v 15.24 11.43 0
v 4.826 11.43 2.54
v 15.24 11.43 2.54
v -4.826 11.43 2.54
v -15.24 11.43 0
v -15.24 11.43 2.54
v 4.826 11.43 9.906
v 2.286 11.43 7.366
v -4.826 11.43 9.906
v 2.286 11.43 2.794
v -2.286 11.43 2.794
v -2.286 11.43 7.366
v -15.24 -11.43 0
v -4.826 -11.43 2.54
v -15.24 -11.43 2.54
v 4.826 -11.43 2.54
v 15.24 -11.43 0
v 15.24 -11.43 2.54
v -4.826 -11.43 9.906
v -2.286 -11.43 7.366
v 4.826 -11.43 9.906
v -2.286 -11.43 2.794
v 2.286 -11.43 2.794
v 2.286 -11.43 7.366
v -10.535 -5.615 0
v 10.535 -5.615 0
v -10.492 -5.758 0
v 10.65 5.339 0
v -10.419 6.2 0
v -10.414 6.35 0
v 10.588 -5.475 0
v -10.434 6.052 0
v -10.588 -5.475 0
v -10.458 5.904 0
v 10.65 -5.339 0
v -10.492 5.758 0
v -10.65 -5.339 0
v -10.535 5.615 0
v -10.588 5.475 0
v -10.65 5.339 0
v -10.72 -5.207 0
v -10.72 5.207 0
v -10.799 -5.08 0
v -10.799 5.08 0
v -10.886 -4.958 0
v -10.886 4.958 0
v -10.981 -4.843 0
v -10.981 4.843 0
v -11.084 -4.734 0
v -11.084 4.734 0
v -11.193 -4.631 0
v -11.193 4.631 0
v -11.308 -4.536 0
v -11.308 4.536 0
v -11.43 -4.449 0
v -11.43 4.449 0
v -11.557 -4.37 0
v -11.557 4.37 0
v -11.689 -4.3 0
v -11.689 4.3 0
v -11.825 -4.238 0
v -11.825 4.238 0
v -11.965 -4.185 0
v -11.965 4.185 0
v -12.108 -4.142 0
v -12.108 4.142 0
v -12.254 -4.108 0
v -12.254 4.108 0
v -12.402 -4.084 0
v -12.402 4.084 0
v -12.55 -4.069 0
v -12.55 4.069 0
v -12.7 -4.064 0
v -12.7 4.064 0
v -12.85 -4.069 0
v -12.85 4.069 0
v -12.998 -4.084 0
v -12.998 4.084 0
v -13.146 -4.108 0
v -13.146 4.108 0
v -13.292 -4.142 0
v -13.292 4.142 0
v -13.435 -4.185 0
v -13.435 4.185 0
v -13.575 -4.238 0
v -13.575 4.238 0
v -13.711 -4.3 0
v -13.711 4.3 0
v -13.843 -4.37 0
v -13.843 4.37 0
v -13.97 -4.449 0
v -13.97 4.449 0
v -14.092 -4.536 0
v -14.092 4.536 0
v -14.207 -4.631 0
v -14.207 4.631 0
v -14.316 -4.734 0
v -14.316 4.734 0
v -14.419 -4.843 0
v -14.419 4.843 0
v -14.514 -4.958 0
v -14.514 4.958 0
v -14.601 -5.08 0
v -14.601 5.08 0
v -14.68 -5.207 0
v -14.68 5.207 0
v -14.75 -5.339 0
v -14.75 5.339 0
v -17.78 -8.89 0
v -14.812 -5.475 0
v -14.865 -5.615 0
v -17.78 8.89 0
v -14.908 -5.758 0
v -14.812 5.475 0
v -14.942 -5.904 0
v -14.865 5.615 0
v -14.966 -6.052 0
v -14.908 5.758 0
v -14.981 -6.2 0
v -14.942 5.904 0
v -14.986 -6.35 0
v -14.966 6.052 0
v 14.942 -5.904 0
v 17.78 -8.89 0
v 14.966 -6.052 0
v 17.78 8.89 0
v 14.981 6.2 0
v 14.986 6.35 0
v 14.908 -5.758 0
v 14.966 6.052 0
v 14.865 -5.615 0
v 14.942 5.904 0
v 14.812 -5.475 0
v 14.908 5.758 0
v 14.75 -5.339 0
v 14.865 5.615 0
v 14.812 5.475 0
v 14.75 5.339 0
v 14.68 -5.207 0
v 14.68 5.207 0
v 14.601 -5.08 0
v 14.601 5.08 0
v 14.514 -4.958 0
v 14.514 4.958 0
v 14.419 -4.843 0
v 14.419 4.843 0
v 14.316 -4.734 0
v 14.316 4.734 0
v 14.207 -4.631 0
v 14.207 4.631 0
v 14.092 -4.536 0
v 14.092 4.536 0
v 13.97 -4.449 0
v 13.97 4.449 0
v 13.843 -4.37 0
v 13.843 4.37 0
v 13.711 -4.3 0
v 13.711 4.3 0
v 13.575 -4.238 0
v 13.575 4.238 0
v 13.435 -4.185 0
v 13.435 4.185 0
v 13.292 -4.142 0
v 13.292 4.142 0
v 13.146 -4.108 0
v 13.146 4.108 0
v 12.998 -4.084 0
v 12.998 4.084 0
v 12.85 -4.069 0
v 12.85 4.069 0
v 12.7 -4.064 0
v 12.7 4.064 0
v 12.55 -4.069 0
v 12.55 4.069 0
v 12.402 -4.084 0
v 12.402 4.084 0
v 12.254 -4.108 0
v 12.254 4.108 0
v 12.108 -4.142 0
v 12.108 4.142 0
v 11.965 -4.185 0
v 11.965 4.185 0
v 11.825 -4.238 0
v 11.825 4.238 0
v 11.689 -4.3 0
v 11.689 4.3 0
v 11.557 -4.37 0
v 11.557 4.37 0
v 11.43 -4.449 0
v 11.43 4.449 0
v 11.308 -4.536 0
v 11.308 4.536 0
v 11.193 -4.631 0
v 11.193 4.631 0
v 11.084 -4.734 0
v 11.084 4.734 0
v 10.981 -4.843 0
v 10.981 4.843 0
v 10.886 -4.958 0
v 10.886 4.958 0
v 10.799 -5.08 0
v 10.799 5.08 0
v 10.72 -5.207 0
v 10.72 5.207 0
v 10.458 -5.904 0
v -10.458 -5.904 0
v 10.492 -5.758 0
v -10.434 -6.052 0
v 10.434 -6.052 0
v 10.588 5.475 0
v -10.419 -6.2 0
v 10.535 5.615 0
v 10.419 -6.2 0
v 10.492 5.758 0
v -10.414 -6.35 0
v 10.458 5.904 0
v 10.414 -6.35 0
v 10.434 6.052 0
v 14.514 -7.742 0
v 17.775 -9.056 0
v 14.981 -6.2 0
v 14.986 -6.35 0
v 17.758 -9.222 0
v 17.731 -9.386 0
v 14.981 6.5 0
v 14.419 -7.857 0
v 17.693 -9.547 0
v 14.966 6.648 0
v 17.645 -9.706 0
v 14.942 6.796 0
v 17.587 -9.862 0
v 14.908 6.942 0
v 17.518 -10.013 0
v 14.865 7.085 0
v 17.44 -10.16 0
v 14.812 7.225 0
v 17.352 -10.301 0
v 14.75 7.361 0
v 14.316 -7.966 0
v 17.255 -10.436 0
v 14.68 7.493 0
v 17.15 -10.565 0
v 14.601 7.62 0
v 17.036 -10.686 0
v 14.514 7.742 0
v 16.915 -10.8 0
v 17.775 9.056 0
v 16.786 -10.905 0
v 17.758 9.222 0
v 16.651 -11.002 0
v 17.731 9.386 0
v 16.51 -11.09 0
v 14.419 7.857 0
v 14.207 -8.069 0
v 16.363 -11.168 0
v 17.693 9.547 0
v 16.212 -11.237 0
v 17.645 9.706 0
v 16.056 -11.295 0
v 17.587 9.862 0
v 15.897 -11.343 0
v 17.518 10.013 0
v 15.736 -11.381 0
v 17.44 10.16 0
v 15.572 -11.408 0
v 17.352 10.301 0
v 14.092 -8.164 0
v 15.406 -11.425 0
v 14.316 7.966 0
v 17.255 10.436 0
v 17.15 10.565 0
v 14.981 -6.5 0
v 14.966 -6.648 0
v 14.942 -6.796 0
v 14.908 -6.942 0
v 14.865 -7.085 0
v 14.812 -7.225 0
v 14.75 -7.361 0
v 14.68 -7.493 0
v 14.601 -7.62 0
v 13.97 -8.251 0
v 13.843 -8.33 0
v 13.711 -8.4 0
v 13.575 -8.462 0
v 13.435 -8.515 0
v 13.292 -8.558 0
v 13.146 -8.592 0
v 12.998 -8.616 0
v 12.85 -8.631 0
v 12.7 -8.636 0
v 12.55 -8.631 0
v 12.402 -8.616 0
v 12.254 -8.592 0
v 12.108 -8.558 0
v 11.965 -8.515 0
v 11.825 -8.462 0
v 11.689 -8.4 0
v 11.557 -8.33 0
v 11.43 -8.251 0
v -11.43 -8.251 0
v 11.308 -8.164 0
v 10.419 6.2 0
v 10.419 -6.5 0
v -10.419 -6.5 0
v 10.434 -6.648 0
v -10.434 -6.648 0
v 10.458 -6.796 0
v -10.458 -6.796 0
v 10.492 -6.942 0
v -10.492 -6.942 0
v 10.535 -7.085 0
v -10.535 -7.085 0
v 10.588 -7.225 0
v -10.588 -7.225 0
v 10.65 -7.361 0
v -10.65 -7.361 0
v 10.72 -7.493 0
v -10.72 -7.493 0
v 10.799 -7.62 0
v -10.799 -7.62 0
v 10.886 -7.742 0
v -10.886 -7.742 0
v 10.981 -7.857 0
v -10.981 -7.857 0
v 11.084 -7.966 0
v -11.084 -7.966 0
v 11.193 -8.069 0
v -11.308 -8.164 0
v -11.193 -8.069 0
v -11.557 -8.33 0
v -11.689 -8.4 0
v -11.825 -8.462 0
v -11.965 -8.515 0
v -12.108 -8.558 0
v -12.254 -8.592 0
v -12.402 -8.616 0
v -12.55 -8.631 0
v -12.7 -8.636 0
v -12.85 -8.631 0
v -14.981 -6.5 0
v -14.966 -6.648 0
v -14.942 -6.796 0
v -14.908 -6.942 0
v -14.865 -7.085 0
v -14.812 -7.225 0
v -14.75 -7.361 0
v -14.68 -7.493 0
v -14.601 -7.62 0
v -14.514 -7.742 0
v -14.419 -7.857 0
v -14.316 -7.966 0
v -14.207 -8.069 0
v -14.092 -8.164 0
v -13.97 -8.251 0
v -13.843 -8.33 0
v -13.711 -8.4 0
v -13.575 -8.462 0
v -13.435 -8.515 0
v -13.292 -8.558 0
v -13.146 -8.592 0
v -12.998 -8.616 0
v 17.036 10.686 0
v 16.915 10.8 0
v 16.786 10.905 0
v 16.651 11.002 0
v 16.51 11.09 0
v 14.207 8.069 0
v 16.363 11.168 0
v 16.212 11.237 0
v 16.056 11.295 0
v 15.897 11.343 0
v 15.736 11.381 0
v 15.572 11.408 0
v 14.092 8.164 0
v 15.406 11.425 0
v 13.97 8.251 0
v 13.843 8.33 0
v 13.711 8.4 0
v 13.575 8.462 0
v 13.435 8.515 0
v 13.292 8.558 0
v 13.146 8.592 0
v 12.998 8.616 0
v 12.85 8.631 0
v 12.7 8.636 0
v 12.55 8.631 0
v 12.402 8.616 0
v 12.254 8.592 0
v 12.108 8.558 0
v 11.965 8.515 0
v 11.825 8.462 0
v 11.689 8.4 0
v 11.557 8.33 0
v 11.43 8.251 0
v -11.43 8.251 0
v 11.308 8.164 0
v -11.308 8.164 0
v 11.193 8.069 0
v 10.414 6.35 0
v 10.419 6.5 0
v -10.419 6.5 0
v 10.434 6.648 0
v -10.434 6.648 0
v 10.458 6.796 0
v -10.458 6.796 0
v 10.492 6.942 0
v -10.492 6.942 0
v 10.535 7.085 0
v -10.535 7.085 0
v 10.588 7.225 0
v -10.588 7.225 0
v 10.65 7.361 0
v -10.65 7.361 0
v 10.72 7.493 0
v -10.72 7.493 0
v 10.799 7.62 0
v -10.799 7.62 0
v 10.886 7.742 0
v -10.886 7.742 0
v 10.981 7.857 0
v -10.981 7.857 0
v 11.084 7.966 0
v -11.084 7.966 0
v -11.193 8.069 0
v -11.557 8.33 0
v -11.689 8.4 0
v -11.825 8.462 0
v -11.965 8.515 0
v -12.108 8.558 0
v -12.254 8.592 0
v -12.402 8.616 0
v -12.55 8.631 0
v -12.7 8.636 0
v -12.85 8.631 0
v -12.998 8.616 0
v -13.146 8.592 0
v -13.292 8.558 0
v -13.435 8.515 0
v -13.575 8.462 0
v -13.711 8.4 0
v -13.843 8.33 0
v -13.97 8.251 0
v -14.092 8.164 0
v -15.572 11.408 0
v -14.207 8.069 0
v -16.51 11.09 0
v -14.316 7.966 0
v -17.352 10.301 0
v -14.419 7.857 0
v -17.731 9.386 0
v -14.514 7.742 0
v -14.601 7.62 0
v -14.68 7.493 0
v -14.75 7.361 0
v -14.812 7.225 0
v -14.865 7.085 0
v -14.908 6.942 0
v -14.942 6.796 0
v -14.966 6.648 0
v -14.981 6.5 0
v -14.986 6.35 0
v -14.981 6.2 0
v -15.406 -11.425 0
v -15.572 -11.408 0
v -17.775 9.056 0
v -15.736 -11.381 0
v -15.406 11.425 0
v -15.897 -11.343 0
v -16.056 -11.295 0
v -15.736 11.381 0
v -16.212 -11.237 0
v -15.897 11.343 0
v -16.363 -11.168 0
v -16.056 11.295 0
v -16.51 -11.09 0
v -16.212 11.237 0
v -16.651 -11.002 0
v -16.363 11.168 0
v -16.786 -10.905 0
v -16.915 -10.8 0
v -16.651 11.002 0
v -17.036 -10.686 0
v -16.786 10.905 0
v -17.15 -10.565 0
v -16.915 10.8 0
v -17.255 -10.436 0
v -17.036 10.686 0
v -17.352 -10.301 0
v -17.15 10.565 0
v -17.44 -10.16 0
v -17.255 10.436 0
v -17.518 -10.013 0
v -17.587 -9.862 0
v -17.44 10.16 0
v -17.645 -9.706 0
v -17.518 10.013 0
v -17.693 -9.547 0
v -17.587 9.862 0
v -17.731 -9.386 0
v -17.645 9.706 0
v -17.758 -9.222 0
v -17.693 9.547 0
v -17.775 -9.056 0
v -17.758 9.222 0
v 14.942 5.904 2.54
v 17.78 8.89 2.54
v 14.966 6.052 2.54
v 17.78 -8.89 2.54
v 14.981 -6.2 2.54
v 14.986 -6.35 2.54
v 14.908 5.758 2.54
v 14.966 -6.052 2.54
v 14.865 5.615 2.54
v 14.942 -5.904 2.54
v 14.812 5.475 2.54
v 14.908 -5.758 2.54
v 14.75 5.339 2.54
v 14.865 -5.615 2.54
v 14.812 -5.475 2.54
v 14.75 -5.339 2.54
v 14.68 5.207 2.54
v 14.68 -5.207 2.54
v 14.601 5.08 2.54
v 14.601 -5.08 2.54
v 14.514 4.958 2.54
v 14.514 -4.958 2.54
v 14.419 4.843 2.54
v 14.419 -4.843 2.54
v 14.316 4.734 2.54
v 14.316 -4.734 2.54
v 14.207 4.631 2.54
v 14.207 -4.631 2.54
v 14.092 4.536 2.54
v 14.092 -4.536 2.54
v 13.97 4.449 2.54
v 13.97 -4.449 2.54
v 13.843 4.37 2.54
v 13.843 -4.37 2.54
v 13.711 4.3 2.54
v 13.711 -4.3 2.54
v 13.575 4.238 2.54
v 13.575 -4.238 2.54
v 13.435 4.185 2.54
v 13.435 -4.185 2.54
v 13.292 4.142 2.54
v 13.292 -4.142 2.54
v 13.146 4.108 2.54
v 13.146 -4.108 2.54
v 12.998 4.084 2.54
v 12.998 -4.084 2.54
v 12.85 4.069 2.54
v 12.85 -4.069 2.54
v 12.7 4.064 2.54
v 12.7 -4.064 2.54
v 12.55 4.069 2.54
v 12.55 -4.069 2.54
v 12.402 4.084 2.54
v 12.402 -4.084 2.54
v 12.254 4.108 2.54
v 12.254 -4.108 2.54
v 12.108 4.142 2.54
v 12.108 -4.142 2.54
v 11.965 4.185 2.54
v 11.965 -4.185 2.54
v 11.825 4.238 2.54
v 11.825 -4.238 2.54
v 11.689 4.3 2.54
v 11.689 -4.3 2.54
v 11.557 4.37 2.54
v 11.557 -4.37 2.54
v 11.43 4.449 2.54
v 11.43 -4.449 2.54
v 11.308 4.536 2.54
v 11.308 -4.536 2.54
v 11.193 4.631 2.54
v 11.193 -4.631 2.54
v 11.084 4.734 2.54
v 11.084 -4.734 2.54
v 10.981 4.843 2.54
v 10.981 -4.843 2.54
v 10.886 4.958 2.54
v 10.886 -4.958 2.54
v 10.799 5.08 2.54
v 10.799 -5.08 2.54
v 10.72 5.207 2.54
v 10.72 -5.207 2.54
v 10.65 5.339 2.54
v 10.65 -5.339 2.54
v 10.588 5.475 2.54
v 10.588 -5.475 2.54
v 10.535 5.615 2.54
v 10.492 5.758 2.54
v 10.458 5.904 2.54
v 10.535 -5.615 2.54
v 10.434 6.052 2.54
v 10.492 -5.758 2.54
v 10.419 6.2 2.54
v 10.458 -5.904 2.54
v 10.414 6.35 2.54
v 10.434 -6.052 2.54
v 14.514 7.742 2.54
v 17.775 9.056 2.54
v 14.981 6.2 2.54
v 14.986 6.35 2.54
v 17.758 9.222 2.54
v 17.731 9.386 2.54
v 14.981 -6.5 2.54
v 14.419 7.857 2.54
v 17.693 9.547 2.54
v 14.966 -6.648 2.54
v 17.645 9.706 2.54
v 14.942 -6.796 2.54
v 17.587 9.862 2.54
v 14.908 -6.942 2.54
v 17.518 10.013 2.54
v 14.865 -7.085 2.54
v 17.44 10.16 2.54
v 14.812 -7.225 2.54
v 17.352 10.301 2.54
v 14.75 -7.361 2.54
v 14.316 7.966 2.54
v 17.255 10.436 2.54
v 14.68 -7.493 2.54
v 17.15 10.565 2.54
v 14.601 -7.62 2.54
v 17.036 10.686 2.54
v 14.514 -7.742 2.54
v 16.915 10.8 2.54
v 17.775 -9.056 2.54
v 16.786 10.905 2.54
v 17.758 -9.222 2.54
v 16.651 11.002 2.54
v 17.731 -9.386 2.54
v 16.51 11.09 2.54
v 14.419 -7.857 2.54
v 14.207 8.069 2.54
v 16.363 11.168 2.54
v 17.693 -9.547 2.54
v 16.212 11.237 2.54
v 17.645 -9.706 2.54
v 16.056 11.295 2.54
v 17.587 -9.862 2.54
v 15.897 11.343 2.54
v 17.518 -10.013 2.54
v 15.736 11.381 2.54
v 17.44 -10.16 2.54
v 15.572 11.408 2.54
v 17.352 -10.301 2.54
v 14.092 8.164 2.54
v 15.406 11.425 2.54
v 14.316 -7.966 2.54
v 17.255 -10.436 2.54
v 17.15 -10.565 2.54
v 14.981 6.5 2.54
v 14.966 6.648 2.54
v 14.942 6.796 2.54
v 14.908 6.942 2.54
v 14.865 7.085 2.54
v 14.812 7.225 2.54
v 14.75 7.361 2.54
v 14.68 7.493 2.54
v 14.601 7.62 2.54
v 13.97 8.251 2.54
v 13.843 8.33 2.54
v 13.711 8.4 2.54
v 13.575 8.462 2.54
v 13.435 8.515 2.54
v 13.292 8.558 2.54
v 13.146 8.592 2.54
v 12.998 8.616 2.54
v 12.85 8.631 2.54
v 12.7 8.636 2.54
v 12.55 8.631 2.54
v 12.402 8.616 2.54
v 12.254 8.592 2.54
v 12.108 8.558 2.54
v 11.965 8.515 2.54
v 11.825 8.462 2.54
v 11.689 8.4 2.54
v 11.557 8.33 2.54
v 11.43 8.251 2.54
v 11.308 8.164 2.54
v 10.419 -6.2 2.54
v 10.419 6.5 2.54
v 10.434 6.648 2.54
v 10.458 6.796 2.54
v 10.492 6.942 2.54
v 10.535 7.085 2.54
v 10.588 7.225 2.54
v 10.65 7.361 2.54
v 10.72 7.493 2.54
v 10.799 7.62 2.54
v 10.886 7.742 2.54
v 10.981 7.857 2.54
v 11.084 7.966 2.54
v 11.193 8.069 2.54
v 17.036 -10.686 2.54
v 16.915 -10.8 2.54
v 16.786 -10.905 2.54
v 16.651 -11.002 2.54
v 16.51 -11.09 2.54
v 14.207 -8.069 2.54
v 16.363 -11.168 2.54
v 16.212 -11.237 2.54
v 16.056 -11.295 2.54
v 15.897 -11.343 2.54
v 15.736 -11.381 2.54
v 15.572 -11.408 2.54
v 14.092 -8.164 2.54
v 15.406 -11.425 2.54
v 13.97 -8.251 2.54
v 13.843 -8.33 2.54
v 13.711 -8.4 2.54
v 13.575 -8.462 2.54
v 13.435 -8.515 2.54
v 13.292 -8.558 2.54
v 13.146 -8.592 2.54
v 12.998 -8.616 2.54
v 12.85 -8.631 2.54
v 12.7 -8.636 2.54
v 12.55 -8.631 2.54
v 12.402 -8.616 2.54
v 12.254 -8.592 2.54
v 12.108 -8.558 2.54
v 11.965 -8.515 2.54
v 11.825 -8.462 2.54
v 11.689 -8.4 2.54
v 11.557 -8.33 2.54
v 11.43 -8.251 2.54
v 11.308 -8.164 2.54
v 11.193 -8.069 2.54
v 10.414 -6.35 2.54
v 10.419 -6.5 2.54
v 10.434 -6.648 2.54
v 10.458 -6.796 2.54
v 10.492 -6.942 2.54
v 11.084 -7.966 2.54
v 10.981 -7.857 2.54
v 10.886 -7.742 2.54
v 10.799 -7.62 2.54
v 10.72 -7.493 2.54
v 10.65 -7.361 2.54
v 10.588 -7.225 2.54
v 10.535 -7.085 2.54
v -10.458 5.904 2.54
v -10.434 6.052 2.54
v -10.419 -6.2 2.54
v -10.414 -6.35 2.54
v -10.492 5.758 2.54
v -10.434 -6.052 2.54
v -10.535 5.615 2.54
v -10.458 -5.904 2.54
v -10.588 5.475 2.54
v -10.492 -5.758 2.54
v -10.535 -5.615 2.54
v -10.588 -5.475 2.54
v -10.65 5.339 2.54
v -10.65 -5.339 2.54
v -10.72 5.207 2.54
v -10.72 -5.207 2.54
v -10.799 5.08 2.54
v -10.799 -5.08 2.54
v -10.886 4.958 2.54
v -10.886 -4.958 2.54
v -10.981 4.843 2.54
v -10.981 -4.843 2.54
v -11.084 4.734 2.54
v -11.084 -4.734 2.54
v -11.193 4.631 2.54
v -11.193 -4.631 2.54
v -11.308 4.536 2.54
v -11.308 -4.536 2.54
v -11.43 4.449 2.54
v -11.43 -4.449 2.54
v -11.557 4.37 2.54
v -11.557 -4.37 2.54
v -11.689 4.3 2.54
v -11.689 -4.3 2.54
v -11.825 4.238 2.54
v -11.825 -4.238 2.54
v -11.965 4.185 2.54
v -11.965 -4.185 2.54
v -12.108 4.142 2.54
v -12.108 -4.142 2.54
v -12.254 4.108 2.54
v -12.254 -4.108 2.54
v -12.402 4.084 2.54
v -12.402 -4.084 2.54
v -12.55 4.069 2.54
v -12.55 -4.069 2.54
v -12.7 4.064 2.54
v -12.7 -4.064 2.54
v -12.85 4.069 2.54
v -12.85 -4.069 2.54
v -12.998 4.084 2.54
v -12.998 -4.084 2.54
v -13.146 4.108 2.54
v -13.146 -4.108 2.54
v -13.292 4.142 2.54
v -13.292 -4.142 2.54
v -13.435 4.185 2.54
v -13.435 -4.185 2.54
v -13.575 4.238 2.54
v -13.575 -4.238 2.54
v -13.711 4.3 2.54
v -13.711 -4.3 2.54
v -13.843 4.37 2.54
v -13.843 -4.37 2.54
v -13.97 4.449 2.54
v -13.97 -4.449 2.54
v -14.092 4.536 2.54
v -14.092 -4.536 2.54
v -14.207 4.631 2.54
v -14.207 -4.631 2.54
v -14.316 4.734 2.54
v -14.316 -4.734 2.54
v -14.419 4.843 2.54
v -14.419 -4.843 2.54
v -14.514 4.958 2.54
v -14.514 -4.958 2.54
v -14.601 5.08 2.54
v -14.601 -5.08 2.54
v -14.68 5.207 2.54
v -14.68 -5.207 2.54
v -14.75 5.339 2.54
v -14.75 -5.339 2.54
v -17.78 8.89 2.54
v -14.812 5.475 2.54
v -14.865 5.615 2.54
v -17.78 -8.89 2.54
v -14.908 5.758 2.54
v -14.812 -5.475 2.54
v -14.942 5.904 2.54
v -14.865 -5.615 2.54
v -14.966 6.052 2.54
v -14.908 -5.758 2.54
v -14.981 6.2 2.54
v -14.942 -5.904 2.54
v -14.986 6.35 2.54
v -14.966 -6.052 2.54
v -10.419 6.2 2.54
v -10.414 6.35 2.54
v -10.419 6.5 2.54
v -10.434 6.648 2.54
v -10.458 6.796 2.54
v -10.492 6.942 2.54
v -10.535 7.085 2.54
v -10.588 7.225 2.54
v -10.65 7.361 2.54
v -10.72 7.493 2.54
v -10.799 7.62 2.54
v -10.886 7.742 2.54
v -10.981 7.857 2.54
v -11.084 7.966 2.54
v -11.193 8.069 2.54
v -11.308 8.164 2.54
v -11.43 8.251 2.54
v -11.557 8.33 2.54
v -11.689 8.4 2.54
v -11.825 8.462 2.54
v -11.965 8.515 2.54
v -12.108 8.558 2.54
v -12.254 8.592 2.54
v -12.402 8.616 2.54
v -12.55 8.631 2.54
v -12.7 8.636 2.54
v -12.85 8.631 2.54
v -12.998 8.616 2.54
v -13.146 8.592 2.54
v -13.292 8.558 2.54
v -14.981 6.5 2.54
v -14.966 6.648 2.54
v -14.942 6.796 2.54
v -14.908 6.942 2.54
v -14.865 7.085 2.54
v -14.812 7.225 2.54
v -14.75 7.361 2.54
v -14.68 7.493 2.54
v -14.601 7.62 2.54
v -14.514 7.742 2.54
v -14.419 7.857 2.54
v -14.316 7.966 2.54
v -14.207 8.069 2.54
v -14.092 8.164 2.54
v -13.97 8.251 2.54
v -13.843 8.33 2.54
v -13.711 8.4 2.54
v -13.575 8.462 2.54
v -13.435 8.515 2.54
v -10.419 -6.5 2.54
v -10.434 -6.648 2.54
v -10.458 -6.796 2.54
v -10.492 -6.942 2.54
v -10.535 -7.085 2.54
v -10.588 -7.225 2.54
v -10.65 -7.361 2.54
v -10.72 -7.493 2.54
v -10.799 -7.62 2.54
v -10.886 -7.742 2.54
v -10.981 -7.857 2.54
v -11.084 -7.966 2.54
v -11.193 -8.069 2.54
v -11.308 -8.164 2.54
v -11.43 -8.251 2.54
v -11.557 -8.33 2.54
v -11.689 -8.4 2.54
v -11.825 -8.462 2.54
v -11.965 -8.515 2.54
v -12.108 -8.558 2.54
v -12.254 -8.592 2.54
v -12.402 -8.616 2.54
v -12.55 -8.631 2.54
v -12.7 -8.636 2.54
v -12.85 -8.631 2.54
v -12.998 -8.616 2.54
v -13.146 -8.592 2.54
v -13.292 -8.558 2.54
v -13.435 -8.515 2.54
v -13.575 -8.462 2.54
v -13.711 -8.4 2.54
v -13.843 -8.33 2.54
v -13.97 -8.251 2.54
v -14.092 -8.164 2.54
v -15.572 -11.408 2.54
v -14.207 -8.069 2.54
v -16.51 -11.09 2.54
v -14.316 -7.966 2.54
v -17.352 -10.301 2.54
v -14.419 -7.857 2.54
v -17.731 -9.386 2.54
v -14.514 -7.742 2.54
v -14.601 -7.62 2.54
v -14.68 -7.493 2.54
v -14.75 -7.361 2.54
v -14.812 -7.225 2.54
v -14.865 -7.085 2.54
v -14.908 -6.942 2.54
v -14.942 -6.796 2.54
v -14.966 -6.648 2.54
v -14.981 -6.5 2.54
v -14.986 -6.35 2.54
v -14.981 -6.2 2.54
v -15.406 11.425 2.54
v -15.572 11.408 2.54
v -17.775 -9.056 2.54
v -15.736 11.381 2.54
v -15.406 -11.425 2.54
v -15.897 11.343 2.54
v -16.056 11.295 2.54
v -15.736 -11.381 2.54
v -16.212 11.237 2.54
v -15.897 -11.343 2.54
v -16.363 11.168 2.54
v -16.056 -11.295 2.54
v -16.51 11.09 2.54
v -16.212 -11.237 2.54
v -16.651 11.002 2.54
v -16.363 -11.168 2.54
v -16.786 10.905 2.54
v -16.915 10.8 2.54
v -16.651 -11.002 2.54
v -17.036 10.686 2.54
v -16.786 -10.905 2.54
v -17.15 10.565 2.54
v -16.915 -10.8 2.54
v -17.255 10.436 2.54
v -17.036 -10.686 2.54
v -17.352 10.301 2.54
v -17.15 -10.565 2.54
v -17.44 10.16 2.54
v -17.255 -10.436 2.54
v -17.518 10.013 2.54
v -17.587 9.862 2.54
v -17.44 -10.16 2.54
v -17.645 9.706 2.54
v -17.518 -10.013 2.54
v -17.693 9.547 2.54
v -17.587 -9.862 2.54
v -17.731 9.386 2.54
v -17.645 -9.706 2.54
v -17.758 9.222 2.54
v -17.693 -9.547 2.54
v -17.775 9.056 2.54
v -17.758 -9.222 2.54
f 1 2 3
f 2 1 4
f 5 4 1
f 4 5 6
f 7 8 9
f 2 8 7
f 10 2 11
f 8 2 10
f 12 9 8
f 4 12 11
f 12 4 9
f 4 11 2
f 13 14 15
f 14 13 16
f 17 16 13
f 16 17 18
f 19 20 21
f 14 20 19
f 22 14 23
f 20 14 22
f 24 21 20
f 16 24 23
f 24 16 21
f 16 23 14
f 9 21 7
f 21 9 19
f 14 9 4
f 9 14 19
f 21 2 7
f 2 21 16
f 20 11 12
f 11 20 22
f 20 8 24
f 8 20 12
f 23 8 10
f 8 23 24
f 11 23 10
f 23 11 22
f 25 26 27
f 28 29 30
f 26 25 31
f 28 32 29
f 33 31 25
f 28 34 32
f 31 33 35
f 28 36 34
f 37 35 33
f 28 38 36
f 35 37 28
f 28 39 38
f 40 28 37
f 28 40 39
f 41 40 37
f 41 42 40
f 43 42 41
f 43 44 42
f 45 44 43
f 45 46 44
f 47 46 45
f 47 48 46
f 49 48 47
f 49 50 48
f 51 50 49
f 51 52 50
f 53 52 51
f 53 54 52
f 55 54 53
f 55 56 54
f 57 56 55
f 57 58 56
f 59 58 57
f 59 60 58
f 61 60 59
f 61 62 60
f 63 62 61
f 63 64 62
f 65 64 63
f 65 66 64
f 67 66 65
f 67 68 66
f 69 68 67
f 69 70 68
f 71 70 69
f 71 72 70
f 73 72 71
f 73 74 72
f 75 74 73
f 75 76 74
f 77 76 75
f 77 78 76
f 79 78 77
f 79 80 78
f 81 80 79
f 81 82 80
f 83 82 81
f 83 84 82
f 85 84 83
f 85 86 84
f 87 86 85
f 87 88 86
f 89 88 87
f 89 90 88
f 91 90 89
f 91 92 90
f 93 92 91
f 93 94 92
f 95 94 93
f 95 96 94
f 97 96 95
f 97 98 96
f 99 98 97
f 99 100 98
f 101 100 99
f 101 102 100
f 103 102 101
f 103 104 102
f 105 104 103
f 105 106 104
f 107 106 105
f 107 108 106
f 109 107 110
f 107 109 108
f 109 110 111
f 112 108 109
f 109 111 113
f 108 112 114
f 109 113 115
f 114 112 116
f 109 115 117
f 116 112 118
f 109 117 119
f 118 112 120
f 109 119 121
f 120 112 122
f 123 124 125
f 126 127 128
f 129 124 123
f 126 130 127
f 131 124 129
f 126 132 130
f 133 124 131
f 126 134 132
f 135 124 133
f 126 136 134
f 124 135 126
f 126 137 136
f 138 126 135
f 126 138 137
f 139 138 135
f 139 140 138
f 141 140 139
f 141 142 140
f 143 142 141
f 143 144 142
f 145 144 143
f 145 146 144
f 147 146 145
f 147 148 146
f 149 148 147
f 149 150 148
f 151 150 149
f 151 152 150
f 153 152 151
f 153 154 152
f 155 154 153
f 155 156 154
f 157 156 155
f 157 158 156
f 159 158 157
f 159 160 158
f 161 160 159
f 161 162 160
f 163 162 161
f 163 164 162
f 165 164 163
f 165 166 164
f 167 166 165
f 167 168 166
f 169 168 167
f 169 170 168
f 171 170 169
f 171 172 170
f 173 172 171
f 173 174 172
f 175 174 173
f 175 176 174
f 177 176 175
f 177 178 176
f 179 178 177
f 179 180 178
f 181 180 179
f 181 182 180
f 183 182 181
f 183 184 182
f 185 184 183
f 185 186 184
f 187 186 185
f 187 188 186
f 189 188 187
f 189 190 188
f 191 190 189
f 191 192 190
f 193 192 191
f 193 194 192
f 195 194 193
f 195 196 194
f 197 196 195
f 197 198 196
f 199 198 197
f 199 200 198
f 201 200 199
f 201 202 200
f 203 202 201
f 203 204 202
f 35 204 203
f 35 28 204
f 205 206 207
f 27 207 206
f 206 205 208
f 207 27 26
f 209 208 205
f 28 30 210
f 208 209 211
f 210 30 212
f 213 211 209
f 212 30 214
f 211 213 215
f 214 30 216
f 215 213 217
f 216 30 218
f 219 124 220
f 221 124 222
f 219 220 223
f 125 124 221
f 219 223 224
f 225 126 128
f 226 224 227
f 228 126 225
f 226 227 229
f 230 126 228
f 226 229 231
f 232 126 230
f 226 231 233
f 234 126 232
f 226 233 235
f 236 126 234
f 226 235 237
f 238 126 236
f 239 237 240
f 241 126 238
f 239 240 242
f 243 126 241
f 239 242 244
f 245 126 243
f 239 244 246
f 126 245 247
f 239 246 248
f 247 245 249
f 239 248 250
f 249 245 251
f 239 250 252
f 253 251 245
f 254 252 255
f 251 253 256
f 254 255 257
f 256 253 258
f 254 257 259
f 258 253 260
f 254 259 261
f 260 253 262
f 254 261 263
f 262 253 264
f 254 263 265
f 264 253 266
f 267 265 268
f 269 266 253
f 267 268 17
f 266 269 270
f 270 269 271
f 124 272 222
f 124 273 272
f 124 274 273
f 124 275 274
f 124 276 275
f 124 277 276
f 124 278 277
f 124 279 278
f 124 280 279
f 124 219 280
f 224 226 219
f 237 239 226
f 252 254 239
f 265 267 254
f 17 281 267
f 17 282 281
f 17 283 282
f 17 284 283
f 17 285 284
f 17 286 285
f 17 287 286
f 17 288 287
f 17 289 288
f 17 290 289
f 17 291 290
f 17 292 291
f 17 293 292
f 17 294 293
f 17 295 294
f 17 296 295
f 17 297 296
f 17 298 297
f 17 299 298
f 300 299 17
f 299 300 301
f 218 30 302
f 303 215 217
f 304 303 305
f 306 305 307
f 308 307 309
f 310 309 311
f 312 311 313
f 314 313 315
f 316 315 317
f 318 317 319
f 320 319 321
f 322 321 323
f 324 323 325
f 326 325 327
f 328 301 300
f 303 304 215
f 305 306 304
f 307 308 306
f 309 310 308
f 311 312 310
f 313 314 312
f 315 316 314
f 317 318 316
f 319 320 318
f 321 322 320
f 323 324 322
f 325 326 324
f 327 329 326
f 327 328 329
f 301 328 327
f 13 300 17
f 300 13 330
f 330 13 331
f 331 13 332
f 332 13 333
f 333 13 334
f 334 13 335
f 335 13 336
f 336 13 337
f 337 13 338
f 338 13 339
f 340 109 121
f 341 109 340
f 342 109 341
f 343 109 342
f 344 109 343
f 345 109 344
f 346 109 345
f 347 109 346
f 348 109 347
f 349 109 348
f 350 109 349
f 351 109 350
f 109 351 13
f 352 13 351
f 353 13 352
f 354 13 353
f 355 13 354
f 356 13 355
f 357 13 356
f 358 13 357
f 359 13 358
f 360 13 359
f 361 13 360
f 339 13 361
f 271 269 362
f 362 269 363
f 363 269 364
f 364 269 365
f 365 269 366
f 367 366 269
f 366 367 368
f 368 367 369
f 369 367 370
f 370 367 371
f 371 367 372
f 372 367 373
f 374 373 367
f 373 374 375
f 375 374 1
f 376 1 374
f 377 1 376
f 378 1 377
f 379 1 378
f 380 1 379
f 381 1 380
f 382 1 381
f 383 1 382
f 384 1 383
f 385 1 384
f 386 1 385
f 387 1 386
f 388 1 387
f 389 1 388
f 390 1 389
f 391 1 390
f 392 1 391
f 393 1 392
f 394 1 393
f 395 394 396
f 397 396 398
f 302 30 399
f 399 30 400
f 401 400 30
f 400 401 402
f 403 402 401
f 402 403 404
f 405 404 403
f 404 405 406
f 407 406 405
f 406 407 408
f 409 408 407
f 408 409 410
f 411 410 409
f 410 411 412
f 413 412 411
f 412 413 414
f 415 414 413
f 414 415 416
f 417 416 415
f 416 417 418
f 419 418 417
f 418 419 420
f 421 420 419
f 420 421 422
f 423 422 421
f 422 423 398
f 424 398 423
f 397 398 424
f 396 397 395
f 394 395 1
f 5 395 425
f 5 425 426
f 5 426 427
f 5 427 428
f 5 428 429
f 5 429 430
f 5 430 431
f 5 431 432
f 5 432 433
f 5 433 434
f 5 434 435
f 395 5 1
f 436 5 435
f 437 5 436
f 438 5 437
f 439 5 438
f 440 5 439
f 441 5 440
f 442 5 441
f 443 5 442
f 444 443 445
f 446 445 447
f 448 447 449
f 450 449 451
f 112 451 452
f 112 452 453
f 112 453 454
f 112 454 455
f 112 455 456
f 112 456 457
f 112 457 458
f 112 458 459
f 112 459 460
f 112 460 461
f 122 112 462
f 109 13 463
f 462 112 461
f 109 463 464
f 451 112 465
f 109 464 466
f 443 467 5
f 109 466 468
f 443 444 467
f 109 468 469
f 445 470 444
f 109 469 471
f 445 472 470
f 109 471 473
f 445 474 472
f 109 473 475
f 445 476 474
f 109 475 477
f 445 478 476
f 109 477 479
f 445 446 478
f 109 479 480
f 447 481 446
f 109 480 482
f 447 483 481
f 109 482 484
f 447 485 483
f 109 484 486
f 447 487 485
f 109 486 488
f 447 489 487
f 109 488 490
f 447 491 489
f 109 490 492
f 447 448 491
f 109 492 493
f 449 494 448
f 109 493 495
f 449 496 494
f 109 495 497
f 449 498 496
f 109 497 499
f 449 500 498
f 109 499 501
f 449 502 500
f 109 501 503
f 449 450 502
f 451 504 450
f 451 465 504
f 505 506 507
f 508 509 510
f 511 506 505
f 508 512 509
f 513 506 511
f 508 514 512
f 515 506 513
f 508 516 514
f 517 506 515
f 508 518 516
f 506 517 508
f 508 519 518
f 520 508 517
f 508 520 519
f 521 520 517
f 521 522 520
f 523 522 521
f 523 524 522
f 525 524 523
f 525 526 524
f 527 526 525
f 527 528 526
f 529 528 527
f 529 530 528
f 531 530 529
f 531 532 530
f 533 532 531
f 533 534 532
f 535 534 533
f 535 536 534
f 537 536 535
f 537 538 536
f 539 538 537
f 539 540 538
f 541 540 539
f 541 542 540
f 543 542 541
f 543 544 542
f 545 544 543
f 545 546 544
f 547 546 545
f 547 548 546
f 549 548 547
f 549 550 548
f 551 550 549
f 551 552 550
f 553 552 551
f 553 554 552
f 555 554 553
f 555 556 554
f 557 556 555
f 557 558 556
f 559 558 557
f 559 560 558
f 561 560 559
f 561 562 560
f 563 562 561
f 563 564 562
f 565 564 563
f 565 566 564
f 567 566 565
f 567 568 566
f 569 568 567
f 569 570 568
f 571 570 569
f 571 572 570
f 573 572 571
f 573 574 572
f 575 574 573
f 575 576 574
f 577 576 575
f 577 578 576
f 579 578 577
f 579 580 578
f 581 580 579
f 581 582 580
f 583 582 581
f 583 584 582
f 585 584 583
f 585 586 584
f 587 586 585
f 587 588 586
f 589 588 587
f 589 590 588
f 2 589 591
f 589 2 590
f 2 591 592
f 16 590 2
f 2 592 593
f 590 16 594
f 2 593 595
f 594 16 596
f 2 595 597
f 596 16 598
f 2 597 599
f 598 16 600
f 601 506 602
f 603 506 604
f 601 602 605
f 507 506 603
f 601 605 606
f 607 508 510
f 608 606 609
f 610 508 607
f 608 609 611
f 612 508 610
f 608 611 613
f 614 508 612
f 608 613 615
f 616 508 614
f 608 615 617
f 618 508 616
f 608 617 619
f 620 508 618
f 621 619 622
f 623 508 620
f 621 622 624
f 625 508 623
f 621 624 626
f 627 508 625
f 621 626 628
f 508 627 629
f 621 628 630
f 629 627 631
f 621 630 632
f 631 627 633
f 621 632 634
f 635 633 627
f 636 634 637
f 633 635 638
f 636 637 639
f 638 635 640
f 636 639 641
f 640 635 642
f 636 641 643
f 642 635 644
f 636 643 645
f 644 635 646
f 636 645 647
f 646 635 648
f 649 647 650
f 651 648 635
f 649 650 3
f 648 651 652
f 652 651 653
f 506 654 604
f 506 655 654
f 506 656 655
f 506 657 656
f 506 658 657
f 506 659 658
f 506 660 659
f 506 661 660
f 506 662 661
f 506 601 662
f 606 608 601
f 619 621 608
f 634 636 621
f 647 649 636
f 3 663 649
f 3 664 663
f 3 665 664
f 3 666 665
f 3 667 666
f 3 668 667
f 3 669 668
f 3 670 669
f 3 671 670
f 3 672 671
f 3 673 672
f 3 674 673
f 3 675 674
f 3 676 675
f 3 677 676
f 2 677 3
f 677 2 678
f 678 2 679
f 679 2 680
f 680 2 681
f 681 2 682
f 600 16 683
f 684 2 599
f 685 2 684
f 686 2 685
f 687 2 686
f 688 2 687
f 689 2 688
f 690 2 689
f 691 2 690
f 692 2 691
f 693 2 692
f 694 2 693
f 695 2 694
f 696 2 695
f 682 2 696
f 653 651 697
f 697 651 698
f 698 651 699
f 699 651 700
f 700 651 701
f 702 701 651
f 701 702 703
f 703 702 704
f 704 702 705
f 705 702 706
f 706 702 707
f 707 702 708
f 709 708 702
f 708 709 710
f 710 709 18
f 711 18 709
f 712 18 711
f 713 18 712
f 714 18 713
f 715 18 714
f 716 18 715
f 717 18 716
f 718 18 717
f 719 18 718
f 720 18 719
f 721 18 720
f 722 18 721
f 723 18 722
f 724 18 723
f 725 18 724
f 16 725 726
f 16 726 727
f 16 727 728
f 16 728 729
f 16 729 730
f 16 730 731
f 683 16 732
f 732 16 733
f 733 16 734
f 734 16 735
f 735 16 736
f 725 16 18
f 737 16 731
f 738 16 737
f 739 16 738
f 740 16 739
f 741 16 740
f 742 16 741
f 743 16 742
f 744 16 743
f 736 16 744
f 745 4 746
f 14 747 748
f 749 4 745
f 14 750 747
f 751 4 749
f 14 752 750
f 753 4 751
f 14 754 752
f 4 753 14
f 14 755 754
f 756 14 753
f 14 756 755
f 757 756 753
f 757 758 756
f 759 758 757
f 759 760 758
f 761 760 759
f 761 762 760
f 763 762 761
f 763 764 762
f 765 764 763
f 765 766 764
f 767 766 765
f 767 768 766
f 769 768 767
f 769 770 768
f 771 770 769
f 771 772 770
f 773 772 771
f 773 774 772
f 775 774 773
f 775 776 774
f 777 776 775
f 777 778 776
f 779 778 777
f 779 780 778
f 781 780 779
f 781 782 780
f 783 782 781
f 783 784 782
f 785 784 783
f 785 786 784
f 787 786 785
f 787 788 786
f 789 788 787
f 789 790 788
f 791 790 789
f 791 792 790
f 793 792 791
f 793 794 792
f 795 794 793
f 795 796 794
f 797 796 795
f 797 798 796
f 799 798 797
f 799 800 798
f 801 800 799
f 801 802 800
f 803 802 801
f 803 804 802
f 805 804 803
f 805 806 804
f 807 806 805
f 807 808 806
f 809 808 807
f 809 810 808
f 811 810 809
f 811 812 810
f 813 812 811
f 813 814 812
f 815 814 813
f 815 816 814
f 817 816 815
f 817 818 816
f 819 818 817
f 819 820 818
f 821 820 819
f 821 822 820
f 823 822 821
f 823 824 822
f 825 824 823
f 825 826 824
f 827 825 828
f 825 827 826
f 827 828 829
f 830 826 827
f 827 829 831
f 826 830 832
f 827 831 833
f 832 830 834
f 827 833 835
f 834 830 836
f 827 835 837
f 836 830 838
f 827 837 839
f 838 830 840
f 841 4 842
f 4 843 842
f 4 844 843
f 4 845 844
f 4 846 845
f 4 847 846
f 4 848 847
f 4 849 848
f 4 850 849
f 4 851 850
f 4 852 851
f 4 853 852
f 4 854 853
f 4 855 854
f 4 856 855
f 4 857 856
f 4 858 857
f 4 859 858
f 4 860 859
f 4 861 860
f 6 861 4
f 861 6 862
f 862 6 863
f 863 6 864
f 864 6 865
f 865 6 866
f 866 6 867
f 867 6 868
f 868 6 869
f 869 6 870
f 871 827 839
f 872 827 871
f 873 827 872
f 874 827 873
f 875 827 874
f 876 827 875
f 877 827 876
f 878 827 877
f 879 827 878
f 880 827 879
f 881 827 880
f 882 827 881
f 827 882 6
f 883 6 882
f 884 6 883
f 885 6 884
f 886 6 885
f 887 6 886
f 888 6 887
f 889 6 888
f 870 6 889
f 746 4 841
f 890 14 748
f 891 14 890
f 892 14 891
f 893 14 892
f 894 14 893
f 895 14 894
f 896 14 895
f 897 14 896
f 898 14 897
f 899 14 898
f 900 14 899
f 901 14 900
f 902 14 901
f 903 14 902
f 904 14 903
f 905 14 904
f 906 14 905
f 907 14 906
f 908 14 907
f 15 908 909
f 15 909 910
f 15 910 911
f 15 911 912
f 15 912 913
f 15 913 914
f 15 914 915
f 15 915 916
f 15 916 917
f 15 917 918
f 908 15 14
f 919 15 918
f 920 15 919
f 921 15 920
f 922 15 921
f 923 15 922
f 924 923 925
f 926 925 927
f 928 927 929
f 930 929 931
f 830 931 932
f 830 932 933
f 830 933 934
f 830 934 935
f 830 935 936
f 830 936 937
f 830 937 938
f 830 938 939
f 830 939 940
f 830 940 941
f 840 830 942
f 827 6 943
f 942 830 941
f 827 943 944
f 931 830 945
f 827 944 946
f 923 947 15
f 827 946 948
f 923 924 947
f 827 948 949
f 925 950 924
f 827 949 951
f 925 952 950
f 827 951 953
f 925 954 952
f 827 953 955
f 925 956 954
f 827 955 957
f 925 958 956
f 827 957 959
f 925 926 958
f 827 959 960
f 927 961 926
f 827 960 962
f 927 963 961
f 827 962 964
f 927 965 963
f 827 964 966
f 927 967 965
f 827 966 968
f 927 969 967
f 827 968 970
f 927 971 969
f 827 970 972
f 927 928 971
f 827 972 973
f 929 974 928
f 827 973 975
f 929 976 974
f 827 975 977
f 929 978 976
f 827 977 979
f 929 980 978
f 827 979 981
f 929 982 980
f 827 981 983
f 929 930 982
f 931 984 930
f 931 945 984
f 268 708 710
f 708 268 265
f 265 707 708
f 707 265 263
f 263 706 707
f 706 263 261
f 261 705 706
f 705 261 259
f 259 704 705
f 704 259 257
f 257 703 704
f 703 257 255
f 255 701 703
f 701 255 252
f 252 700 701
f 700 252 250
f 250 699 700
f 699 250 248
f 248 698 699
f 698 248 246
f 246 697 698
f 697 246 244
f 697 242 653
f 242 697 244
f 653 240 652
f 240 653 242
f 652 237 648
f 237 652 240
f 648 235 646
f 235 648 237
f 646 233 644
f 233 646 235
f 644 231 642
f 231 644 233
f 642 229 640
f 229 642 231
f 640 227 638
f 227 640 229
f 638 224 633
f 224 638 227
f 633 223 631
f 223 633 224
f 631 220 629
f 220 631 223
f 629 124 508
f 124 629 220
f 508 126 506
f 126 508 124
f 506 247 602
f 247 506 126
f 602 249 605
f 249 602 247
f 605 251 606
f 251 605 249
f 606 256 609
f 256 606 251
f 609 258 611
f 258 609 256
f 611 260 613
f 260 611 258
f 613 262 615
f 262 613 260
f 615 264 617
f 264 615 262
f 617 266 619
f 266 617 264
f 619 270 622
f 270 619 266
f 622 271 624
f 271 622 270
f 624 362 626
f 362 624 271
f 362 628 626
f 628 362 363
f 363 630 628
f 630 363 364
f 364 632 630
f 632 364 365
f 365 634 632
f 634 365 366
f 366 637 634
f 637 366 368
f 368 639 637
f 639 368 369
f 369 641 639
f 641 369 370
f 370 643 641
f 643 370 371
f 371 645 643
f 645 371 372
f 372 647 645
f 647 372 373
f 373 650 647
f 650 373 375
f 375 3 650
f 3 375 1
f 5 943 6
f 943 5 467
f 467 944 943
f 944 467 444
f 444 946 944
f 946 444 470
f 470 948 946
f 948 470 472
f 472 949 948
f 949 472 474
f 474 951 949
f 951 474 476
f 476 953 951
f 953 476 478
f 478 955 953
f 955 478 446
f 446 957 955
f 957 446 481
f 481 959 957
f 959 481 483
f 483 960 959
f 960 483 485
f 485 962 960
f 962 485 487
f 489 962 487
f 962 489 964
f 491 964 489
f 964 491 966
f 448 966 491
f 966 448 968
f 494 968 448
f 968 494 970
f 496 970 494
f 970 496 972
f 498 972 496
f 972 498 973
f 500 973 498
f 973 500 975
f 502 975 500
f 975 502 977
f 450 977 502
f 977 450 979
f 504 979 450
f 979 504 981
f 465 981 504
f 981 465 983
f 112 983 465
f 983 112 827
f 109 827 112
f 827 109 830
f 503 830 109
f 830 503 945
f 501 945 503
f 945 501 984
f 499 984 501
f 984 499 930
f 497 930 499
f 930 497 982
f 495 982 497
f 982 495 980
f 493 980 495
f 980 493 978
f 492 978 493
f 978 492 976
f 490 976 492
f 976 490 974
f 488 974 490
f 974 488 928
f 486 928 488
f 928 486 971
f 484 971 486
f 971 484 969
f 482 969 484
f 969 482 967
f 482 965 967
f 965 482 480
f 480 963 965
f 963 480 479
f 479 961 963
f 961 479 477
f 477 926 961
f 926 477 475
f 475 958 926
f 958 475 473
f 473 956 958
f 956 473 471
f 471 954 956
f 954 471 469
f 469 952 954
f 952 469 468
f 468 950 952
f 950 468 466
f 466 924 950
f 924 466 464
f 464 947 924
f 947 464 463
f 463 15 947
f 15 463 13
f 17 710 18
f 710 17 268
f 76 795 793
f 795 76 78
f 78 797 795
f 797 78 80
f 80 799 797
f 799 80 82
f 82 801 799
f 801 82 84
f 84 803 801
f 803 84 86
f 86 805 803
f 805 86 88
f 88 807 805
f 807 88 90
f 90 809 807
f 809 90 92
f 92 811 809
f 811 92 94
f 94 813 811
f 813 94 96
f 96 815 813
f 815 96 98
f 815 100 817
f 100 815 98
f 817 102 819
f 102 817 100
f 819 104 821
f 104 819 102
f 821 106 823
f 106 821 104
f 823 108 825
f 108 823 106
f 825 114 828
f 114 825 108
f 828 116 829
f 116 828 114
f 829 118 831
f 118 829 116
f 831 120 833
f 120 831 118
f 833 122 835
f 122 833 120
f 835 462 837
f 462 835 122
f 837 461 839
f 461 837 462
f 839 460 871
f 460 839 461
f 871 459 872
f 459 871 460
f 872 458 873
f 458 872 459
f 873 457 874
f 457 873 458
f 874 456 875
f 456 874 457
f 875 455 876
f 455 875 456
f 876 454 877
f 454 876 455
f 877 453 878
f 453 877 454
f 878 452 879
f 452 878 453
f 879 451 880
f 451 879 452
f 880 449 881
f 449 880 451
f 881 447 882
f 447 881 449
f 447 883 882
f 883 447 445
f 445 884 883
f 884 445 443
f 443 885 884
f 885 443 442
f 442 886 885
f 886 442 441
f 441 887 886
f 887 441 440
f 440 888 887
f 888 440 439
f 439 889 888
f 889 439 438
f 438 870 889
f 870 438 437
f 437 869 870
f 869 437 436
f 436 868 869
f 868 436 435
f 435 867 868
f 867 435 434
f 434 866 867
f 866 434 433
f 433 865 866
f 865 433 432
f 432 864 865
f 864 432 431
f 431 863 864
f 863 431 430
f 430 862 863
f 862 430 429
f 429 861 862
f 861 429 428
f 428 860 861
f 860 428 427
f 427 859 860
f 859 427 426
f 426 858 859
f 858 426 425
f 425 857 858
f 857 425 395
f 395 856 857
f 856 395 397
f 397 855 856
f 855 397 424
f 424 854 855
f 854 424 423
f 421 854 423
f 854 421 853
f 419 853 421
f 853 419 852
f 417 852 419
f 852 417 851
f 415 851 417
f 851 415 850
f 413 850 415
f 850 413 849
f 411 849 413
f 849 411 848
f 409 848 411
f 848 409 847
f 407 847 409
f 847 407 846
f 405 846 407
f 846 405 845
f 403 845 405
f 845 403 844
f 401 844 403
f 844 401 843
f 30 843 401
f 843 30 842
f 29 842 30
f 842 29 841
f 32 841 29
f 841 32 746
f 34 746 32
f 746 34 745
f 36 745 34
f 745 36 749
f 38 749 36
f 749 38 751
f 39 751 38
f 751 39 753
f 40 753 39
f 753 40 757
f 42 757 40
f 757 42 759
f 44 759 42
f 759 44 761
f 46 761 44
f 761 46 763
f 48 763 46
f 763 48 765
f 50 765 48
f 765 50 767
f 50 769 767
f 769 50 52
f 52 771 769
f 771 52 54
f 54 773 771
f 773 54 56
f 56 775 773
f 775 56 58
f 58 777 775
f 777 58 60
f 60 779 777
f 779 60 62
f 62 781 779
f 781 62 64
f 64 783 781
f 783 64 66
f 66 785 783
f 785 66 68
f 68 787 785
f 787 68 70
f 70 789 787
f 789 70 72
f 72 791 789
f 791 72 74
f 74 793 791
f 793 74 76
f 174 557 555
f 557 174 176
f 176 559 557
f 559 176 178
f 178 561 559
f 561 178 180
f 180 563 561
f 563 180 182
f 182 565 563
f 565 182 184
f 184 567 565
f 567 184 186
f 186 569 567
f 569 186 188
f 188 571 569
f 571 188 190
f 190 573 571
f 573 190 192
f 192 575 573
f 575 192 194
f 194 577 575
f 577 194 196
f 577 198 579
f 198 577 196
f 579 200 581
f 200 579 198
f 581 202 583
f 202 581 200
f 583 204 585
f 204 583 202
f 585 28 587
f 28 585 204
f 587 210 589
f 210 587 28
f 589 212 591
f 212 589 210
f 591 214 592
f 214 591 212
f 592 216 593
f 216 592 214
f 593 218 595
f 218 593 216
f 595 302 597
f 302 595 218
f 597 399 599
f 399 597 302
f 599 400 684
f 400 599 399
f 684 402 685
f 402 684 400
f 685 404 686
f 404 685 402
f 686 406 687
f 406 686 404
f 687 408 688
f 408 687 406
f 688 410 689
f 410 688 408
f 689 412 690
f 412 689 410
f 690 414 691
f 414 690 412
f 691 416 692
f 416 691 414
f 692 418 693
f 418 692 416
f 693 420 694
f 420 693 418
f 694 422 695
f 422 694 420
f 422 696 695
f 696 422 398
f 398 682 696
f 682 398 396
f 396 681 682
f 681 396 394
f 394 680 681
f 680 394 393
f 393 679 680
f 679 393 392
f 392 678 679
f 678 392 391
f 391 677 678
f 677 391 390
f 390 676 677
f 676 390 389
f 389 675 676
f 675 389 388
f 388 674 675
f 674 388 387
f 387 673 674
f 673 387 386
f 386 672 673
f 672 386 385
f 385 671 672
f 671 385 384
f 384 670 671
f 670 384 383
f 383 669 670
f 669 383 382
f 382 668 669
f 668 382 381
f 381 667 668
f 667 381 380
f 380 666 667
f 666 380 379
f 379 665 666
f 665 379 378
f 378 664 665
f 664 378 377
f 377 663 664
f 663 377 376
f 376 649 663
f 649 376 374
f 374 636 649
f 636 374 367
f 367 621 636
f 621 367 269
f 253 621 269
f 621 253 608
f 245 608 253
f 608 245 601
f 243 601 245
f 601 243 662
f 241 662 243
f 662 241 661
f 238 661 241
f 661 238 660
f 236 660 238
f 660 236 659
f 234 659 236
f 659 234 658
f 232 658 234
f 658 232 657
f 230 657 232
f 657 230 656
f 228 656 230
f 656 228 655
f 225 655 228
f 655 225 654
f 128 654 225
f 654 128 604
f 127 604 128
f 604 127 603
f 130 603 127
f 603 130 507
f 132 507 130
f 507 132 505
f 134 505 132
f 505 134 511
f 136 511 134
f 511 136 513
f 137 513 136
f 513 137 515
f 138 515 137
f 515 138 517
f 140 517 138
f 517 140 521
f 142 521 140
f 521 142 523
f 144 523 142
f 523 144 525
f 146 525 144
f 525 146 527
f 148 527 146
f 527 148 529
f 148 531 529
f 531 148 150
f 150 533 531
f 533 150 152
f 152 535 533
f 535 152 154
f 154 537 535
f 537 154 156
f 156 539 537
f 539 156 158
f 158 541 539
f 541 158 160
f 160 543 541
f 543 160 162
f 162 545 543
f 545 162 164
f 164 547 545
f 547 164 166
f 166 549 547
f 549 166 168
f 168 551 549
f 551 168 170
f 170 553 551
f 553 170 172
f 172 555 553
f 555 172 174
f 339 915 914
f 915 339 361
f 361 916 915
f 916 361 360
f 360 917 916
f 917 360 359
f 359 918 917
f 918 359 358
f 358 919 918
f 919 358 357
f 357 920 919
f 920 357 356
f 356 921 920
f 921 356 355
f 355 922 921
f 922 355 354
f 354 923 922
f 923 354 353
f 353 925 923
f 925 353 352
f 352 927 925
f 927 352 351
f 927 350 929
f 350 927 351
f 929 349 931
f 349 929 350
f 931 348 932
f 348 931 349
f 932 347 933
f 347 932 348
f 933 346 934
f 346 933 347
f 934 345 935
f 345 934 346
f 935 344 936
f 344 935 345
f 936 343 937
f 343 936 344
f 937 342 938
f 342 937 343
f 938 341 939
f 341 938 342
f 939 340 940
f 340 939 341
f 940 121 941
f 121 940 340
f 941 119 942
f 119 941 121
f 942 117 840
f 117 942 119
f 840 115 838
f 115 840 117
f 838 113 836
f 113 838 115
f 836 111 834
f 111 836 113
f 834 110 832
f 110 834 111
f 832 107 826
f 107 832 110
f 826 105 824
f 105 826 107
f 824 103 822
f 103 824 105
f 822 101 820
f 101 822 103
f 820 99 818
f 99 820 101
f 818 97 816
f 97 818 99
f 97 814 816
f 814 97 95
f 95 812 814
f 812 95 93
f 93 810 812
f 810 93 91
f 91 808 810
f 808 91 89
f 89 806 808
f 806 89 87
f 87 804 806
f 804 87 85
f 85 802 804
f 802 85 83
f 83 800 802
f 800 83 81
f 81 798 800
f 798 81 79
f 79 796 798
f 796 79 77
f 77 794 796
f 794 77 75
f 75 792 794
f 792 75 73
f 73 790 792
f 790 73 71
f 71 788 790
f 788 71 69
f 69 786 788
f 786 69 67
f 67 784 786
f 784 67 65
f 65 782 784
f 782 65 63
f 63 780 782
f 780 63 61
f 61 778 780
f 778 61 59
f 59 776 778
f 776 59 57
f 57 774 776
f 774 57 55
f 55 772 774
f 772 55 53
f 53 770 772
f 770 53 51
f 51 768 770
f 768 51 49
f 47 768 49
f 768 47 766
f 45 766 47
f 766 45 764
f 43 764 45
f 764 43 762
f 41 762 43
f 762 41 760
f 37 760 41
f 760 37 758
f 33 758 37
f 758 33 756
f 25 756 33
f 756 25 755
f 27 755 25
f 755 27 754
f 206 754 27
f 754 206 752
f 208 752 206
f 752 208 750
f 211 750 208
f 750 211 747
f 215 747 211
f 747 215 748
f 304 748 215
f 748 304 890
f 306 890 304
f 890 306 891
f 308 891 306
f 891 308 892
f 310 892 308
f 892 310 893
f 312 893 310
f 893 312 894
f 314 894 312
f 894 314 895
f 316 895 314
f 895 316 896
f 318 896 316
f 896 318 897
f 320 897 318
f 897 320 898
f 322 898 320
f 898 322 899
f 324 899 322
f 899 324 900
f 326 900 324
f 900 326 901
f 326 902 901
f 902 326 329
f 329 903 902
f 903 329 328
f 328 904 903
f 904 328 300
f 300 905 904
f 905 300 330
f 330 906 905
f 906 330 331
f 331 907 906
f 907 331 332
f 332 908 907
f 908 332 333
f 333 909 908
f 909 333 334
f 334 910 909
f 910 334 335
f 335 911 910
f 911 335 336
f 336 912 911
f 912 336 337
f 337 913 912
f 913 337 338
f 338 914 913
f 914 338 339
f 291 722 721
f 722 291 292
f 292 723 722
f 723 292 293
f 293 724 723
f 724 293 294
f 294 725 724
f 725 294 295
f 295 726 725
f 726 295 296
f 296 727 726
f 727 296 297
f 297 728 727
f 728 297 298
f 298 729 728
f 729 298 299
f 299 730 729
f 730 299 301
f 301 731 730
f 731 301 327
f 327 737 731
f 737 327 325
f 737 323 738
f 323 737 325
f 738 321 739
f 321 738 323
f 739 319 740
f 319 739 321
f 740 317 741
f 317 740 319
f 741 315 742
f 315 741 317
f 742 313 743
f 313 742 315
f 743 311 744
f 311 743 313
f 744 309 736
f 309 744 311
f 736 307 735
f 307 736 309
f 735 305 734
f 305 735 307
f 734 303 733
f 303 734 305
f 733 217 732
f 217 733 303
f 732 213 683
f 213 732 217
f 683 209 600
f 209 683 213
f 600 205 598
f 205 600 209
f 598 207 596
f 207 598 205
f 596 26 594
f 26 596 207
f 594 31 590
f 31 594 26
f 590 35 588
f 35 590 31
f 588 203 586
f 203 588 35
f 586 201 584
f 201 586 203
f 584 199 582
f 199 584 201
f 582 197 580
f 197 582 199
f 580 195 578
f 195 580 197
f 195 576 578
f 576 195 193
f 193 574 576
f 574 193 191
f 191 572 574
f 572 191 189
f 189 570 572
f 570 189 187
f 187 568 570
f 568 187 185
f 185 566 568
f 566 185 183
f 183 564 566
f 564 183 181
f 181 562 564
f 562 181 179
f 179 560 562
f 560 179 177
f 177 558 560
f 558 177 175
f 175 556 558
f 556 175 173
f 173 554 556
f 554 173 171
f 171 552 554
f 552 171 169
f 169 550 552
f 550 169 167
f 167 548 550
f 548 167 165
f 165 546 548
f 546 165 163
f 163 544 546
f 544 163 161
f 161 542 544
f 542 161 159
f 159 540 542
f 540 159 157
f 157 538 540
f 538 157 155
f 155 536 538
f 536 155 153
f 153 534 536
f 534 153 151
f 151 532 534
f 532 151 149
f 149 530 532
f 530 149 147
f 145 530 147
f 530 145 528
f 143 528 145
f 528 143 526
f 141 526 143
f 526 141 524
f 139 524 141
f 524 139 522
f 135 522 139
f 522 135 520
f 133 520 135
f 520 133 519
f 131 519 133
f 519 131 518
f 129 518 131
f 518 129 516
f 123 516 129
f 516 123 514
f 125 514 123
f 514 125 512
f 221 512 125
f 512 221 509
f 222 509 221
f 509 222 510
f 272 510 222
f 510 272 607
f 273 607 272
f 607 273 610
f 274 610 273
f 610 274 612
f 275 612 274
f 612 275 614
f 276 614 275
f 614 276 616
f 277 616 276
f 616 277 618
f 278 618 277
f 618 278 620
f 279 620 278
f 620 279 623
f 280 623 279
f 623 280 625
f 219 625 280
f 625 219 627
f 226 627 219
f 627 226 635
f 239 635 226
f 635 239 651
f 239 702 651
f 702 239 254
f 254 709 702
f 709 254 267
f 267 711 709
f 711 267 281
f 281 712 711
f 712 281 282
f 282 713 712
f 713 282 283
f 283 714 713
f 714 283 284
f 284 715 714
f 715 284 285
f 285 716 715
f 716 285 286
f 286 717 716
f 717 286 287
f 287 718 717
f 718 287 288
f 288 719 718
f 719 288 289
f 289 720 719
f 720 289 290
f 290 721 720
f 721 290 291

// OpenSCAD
ViewScale = [0.0254, 0.0254, 0.0254];

module model_nut()
{
    linear_extrude(170)
    difference()
    {
        circle(377/2, $fn=6);
        circle(140/2, $fn=96);
    }

    translate([0, 0, 169])
    linear_extrude(60)
    difference()
    {
        circle(320/2, $fn=96);
        circle(140/2, $fn=96);
    }
}

module model_bolt()
{
    // head
    linear_extrude(160)
    circle(268/2, $fn=96);

    // Body
    translate([0, 0, 159])
    linear_extrude(1210)
    circle(162/2, $fn=96);
}

module model_rod()
{
    linear_extrude(130)
    square([130, 1000], center=true);
}

module adj_rrect(w,h,r)
{
    hull()
    {
        translate([w/2-r, h/2-r, 0])
        circle(r, $fn=96);
        translate([-w/2+r, h/2-r, 0])
        circle(r, $fn=96);

        translate([w/2-r, -h/2+r, 0])
        circle(r, $fn=96);
        translate([-w/2+r, -h/2+r, 0])
        circle(r, $fn=96);
    }
}


module adj_boltswivelmodule()
{
    difference()
    {
        linear_extrude(300)
        square([500, 500], center = true);

        translate([0, 300, 150])
        rotate([90, 0, 0])
        linear_extrude(600)
        circle(180/2, $fn=96);
    }

}
module adj_boltswivel()
{
    // Body
    for (ii=[0,299,599,899])
    {
        translate([0, 0, ii])
        adj_boltswivelmodule();
    }

    // bolt head insert
    translate([0, 0, 1199])
    linear_extrude(171)
    difference()
    {
        square([500, 500], center=true);
        circle(283/2, $fn=96);
        translate([0, 250, 0])
        square([283, 500], center=true);
    }

    // bolt head capture
    translate([0, 0, 1369])
    linear_extrude(171)
    difference()
    {
        square([500, 500], center=true);
        circle(283/2, $fn=96);
        translate([0, 250, 0])
        square([180, 500], center=true);
    }

    // body
    translate([0, 0, 869])
    linear_extrude(51)
    difference()
    {
        circle(500/2, $fn=96);
        //square([500, 500], center=true);
        circle(182/2, $fn=96);
        translate([0, 250, 0])
        square([180, 500], center=true);
    }
}

module adj_vexmount_side()
{
    difference()
    {
        hull()
        {
            circle(370/2, $fn=96);
            translate([0, 370/2, 0])
            square([370, 170], center=true);
        }
        circle(180/2, $fn=96);
    }
}

module adj_vexmount()
{
    translate([0, 450, 200])
    rotate([90, 0, 0])
    linear_extrude(900)
    difference()
    {
        square([380, 380], center=true);
        square([180, 180], center=true);
    }
    linear_extrude(100)
    {
        difference()
        {
            adj_rrect(1400, 900, 100);
            for (ii = [-500,500])
            {
                for (jj = [-250,250])
                {
                    translate([ii, jj, 00])
                    circle(180/2, $fn=96);
                }
            }
        }
    }
}

module adjuster_forViewing()
{
    *translate([0, 0, 220])
    {
        rotate([0, -45, 0])
        {
            color("lightblue")
            translate([0, 0, 1160])
            model_bolt();
            adj_boltswivel();
            color("lightblue")
            translate([0, 0, 70])
            model_rod();
*            color("lightblue")
            translate([0, 0, 1000])
            model_nut();
        }
    }
    adj_vexmount();
    //adj_boltswivel();
}

module forPrinting()
{
    adj_boltswivel();
}

module model_adjuster()
{
    adjuster_forViewing();
}

scale(ViewScale)
{
    adjuster_forViewing();
//    forPrinting();
}
